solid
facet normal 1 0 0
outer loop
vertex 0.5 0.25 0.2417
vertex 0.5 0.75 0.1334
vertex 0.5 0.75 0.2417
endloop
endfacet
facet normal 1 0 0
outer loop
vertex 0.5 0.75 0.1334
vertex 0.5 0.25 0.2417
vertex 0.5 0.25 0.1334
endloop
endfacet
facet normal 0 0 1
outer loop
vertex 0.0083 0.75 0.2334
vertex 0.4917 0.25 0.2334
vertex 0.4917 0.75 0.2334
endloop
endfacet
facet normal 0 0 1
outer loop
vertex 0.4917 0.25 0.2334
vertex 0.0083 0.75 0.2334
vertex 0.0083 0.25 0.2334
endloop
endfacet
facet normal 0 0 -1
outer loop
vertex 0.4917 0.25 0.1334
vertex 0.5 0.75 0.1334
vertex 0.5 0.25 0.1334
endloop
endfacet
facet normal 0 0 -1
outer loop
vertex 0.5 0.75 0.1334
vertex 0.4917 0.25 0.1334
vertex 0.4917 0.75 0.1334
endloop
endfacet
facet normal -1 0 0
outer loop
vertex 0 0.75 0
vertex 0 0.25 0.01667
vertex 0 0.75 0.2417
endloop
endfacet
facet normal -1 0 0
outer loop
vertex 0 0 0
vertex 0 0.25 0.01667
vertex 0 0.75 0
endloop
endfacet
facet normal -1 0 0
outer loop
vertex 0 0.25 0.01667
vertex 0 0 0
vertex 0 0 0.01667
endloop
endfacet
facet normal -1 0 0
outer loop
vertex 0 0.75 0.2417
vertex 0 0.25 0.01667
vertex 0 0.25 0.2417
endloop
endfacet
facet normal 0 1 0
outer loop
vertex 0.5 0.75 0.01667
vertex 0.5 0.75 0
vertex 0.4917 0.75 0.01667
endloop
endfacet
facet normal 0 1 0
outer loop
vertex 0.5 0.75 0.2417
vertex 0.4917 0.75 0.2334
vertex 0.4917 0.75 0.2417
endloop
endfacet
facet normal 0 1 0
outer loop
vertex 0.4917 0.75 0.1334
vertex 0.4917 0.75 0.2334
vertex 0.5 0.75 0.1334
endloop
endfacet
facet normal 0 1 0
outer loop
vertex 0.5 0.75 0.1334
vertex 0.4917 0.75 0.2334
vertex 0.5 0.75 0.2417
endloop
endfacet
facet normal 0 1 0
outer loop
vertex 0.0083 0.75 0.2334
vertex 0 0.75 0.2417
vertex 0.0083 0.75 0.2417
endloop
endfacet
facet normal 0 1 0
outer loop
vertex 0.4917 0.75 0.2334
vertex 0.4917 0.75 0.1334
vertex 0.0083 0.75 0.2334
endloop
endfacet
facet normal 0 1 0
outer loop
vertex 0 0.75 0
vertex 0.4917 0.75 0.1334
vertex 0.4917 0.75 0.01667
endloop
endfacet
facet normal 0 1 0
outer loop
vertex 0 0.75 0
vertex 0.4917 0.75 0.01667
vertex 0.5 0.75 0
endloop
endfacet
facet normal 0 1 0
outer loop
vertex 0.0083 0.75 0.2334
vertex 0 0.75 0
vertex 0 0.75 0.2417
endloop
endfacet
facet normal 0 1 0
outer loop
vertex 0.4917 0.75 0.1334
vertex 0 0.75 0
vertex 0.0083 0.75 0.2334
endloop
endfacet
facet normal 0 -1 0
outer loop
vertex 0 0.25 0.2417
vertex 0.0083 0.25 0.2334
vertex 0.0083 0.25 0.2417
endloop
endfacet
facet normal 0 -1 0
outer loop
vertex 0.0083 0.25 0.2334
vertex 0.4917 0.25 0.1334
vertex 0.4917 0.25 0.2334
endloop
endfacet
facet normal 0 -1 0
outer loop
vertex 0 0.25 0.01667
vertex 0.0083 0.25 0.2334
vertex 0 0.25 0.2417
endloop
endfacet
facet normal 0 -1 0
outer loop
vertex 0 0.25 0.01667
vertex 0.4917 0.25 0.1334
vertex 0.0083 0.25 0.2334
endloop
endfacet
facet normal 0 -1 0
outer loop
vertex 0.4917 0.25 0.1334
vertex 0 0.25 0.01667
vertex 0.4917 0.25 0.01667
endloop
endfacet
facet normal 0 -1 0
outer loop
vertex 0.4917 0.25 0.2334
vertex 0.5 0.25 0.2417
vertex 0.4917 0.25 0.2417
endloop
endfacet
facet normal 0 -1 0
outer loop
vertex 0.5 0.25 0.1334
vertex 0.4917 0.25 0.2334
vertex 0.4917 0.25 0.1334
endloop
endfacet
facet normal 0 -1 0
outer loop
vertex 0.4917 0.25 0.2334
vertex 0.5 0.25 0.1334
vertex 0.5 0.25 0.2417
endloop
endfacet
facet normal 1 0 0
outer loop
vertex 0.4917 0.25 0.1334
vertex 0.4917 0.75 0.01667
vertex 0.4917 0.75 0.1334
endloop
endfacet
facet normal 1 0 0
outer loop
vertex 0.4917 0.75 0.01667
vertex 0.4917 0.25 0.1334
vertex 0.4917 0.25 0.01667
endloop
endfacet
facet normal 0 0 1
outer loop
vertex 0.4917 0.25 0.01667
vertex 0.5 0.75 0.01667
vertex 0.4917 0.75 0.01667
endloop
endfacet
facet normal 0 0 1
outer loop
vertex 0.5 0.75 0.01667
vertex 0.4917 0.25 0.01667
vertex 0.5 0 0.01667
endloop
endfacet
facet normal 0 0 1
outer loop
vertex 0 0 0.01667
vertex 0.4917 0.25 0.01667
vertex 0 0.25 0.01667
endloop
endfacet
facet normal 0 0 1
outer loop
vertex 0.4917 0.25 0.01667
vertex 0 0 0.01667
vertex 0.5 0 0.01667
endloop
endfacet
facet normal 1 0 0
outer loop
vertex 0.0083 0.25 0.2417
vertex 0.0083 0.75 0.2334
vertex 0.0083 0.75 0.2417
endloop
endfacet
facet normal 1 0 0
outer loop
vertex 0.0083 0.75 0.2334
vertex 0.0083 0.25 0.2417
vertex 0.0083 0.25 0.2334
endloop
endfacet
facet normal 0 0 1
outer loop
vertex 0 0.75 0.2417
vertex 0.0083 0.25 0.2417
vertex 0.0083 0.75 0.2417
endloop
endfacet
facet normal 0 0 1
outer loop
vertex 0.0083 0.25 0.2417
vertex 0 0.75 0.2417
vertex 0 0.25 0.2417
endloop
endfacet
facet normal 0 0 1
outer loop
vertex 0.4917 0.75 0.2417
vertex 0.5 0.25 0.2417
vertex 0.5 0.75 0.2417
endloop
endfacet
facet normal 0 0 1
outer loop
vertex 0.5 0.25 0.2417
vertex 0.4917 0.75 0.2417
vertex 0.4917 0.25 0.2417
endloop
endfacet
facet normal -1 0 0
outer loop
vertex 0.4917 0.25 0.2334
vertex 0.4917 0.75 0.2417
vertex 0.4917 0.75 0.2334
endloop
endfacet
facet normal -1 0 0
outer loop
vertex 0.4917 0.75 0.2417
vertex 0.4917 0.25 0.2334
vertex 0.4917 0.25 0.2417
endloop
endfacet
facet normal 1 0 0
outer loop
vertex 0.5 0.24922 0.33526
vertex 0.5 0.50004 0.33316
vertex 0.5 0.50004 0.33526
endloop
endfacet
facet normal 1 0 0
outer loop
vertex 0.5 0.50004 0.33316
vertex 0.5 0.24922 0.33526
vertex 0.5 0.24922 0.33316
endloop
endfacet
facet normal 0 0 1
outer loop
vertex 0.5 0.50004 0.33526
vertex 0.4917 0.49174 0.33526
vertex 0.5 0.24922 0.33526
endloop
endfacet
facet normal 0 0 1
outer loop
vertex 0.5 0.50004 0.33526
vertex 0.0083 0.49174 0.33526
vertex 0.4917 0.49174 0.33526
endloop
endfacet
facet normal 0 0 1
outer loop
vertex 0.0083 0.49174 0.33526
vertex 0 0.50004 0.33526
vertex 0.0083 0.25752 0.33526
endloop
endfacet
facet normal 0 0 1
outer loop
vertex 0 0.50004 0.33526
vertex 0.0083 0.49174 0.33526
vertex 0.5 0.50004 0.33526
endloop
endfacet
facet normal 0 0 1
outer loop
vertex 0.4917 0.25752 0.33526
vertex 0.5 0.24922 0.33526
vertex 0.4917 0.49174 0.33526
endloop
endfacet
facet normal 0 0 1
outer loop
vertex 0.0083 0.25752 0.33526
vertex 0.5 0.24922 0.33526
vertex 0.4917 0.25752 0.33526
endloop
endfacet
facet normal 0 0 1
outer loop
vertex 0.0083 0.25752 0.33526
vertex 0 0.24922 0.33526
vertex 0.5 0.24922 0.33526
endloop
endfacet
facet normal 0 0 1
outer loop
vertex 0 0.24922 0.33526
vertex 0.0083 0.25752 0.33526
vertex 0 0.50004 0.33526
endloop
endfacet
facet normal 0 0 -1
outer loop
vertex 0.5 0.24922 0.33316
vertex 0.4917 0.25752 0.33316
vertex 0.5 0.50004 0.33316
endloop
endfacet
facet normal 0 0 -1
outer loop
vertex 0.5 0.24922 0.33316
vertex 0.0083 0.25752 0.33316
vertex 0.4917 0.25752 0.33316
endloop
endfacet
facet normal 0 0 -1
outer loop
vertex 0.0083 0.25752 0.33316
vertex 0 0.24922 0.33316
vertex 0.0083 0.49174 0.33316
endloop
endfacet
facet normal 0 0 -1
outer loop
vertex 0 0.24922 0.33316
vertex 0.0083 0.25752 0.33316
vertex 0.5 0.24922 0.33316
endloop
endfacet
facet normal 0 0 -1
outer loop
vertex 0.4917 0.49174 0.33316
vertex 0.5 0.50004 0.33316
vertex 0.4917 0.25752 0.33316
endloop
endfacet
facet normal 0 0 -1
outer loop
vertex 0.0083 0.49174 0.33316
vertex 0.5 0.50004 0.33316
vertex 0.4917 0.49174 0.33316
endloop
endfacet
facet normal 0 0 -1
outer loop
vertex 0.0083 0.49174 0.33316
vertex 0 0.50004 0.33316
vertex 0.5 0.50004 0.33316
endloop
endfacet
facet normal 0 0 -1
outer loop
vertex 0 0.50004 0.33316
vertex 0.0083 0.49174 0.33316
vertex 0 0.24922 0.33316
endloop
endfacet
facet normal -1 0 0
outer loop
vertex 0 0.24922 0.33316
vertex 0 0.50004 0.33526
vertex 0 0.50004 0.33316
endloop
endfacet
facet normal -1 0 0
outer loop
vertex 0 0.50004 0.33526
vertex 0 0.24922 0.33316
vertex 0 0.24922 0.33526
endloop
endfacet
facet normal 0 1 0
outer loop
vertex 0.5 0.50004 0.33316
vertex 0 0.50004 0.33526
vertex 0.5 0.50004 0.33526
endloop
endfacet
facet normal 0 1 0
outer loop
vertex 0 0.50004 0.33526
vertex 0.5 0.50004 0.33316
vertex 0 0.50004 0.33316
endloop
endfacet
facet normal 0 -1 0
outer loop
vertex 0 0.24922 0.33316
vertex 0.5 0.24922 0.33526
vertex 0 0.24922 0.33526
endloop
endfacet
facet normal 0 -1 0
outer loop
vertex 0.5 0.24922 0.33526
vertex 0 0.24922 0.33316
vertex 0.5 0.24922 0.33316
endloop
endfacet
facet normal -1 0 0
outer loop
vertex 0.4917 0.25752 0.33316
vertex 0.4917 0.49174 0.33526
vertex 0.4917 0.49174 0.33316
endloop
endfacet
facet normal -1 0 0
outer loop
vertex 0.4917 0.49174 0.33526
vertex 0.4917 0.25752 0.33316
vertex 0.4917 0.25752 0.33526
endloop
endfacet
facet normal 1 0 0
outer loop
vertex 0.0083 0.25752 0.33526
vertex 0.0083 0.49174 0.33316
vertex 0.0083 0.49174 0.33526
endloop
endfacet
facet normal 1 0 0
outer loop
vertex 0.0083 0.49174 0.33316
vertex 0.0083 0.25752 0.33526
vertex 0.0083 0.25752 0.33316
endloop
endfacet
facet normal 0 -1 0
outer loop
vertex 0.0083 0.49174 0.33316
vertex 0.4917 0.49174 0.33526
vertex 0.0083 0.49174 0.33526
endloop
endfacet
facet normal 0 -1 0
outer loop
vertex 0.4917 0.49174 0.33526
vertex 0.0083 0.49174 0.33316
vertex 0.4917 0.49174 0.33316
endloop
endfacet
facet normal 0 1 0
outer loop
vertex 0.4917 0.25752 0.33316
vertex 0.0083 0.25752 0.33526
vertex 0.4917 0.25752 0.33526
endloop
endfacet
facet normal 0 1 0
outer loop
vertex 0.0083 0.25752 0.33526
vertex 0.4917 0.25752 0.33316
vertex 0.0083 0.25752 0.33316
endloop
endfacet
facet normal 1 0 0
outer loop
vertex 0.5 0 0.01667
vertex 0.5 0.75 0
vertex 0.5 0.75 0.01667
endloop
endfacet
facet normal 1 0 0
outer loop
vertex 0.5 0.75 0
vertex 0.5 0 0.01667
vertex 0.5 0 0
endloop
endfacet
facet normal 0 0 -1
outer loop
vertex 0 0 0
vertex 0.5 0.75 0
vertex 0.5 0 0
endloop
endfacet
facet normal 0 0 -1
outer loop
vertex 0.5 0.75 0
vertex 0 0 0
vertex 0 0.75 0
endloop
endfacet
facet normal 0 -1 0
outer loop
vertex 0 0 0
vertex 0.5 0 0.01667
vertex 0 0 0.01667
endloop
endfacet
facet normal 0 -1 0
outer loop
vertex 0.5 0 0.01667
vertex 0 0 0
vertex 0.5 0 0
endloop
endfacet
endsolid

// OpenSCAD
// Parameters
base_len   = 0.5;       
base_wid   = 0.75;      
base_hgt   = 0.016667;  

// First feature (stepped rear block)
feat1_y_off   = 0.25;      // offset from front edge
feat1_y_size  = 0.5;       // Y footprint (flush to back)
shoulder_z    = 0.2334;    // common shoulder / top datum
pad_depth     = 0.1;       // shallow upper-pad depth from shoulder
deep_depth    = 0.2167;    // deeper continuation depth from shoulder
deep_width    = 0.4917;    // inferred: flush left, inset from right by strip width

// Narrow edge strips
strip_w = 0.0083;
strip_d = 0.5;
strip_h = 0.0083;

// Thin transverse feature
trans_y_off  = 0.24922;
trans_y_size = 0.250819;
trans_thick  = 0.0021;
trans_reach  = 0.335265;
trans_z      = trans_reach - trans_thick;   // bottom Z of transverse slab

// Internal void wall thickness for transverse feature
wall_thick = 0.0083;

$fn = 100;

// Main reference slab
module base_slab() {
    cube([base_len, base_wid, base_hgt]);
}

// Stepped rear feature: shallow pad + deeper continuation, both measured from shoulder
module stepped_feature() {
    // Shallow upper pad: full 0.5 x 0.5 footprint
    translate([0, feat1_y_off, shoulder_z - pad_depth])
        cube([base_len, feat1_y_size, pad_depth]);
    
    // Deeper continuation: contained within pad, shares left/front/back edges
    translate([0, feat1_y_off, base_hgt])
        cube([deep_width, feat1_y_size, shoulder_z - base_hgt]);
}

// Narrow rectangular edge strips on the shoulder of the rear region
module edge_strips() {
    // Left strip, flush to left edge
    translate([0, feat1_y_off, shoulder_z])
        cube([strip_w, strip_d, strip_h]);
    
    // Right strip, flush to right edge
    translate([base_len - strip_w, feat1_y_off, shoulder_z])
        cube([strip_w, strip_d, strip_h]);
}

// Transverse thin solid with preserved closed internal profile as through void
module transverse_feature() {
    difference() {
        // Outer solid
        translate([0, trans_y_off, trans_z])
            cube([base_len, trans_y_size, trans_thick]);
        
        // Open void: closed internal profile inset by wall thickness on all sides
        translate([wall_thick, trans_y_off + wall_thick, trans_z - 0.005])
            cube([base_len - 2*wall_thick, trans_y_size - 2*wall_thick, trans_thick + 0.01]);
    }
}

// Assembly
union() {
    base_slab();
    stepped_feature();
    edge_strips();
    transverse_feature();
}
